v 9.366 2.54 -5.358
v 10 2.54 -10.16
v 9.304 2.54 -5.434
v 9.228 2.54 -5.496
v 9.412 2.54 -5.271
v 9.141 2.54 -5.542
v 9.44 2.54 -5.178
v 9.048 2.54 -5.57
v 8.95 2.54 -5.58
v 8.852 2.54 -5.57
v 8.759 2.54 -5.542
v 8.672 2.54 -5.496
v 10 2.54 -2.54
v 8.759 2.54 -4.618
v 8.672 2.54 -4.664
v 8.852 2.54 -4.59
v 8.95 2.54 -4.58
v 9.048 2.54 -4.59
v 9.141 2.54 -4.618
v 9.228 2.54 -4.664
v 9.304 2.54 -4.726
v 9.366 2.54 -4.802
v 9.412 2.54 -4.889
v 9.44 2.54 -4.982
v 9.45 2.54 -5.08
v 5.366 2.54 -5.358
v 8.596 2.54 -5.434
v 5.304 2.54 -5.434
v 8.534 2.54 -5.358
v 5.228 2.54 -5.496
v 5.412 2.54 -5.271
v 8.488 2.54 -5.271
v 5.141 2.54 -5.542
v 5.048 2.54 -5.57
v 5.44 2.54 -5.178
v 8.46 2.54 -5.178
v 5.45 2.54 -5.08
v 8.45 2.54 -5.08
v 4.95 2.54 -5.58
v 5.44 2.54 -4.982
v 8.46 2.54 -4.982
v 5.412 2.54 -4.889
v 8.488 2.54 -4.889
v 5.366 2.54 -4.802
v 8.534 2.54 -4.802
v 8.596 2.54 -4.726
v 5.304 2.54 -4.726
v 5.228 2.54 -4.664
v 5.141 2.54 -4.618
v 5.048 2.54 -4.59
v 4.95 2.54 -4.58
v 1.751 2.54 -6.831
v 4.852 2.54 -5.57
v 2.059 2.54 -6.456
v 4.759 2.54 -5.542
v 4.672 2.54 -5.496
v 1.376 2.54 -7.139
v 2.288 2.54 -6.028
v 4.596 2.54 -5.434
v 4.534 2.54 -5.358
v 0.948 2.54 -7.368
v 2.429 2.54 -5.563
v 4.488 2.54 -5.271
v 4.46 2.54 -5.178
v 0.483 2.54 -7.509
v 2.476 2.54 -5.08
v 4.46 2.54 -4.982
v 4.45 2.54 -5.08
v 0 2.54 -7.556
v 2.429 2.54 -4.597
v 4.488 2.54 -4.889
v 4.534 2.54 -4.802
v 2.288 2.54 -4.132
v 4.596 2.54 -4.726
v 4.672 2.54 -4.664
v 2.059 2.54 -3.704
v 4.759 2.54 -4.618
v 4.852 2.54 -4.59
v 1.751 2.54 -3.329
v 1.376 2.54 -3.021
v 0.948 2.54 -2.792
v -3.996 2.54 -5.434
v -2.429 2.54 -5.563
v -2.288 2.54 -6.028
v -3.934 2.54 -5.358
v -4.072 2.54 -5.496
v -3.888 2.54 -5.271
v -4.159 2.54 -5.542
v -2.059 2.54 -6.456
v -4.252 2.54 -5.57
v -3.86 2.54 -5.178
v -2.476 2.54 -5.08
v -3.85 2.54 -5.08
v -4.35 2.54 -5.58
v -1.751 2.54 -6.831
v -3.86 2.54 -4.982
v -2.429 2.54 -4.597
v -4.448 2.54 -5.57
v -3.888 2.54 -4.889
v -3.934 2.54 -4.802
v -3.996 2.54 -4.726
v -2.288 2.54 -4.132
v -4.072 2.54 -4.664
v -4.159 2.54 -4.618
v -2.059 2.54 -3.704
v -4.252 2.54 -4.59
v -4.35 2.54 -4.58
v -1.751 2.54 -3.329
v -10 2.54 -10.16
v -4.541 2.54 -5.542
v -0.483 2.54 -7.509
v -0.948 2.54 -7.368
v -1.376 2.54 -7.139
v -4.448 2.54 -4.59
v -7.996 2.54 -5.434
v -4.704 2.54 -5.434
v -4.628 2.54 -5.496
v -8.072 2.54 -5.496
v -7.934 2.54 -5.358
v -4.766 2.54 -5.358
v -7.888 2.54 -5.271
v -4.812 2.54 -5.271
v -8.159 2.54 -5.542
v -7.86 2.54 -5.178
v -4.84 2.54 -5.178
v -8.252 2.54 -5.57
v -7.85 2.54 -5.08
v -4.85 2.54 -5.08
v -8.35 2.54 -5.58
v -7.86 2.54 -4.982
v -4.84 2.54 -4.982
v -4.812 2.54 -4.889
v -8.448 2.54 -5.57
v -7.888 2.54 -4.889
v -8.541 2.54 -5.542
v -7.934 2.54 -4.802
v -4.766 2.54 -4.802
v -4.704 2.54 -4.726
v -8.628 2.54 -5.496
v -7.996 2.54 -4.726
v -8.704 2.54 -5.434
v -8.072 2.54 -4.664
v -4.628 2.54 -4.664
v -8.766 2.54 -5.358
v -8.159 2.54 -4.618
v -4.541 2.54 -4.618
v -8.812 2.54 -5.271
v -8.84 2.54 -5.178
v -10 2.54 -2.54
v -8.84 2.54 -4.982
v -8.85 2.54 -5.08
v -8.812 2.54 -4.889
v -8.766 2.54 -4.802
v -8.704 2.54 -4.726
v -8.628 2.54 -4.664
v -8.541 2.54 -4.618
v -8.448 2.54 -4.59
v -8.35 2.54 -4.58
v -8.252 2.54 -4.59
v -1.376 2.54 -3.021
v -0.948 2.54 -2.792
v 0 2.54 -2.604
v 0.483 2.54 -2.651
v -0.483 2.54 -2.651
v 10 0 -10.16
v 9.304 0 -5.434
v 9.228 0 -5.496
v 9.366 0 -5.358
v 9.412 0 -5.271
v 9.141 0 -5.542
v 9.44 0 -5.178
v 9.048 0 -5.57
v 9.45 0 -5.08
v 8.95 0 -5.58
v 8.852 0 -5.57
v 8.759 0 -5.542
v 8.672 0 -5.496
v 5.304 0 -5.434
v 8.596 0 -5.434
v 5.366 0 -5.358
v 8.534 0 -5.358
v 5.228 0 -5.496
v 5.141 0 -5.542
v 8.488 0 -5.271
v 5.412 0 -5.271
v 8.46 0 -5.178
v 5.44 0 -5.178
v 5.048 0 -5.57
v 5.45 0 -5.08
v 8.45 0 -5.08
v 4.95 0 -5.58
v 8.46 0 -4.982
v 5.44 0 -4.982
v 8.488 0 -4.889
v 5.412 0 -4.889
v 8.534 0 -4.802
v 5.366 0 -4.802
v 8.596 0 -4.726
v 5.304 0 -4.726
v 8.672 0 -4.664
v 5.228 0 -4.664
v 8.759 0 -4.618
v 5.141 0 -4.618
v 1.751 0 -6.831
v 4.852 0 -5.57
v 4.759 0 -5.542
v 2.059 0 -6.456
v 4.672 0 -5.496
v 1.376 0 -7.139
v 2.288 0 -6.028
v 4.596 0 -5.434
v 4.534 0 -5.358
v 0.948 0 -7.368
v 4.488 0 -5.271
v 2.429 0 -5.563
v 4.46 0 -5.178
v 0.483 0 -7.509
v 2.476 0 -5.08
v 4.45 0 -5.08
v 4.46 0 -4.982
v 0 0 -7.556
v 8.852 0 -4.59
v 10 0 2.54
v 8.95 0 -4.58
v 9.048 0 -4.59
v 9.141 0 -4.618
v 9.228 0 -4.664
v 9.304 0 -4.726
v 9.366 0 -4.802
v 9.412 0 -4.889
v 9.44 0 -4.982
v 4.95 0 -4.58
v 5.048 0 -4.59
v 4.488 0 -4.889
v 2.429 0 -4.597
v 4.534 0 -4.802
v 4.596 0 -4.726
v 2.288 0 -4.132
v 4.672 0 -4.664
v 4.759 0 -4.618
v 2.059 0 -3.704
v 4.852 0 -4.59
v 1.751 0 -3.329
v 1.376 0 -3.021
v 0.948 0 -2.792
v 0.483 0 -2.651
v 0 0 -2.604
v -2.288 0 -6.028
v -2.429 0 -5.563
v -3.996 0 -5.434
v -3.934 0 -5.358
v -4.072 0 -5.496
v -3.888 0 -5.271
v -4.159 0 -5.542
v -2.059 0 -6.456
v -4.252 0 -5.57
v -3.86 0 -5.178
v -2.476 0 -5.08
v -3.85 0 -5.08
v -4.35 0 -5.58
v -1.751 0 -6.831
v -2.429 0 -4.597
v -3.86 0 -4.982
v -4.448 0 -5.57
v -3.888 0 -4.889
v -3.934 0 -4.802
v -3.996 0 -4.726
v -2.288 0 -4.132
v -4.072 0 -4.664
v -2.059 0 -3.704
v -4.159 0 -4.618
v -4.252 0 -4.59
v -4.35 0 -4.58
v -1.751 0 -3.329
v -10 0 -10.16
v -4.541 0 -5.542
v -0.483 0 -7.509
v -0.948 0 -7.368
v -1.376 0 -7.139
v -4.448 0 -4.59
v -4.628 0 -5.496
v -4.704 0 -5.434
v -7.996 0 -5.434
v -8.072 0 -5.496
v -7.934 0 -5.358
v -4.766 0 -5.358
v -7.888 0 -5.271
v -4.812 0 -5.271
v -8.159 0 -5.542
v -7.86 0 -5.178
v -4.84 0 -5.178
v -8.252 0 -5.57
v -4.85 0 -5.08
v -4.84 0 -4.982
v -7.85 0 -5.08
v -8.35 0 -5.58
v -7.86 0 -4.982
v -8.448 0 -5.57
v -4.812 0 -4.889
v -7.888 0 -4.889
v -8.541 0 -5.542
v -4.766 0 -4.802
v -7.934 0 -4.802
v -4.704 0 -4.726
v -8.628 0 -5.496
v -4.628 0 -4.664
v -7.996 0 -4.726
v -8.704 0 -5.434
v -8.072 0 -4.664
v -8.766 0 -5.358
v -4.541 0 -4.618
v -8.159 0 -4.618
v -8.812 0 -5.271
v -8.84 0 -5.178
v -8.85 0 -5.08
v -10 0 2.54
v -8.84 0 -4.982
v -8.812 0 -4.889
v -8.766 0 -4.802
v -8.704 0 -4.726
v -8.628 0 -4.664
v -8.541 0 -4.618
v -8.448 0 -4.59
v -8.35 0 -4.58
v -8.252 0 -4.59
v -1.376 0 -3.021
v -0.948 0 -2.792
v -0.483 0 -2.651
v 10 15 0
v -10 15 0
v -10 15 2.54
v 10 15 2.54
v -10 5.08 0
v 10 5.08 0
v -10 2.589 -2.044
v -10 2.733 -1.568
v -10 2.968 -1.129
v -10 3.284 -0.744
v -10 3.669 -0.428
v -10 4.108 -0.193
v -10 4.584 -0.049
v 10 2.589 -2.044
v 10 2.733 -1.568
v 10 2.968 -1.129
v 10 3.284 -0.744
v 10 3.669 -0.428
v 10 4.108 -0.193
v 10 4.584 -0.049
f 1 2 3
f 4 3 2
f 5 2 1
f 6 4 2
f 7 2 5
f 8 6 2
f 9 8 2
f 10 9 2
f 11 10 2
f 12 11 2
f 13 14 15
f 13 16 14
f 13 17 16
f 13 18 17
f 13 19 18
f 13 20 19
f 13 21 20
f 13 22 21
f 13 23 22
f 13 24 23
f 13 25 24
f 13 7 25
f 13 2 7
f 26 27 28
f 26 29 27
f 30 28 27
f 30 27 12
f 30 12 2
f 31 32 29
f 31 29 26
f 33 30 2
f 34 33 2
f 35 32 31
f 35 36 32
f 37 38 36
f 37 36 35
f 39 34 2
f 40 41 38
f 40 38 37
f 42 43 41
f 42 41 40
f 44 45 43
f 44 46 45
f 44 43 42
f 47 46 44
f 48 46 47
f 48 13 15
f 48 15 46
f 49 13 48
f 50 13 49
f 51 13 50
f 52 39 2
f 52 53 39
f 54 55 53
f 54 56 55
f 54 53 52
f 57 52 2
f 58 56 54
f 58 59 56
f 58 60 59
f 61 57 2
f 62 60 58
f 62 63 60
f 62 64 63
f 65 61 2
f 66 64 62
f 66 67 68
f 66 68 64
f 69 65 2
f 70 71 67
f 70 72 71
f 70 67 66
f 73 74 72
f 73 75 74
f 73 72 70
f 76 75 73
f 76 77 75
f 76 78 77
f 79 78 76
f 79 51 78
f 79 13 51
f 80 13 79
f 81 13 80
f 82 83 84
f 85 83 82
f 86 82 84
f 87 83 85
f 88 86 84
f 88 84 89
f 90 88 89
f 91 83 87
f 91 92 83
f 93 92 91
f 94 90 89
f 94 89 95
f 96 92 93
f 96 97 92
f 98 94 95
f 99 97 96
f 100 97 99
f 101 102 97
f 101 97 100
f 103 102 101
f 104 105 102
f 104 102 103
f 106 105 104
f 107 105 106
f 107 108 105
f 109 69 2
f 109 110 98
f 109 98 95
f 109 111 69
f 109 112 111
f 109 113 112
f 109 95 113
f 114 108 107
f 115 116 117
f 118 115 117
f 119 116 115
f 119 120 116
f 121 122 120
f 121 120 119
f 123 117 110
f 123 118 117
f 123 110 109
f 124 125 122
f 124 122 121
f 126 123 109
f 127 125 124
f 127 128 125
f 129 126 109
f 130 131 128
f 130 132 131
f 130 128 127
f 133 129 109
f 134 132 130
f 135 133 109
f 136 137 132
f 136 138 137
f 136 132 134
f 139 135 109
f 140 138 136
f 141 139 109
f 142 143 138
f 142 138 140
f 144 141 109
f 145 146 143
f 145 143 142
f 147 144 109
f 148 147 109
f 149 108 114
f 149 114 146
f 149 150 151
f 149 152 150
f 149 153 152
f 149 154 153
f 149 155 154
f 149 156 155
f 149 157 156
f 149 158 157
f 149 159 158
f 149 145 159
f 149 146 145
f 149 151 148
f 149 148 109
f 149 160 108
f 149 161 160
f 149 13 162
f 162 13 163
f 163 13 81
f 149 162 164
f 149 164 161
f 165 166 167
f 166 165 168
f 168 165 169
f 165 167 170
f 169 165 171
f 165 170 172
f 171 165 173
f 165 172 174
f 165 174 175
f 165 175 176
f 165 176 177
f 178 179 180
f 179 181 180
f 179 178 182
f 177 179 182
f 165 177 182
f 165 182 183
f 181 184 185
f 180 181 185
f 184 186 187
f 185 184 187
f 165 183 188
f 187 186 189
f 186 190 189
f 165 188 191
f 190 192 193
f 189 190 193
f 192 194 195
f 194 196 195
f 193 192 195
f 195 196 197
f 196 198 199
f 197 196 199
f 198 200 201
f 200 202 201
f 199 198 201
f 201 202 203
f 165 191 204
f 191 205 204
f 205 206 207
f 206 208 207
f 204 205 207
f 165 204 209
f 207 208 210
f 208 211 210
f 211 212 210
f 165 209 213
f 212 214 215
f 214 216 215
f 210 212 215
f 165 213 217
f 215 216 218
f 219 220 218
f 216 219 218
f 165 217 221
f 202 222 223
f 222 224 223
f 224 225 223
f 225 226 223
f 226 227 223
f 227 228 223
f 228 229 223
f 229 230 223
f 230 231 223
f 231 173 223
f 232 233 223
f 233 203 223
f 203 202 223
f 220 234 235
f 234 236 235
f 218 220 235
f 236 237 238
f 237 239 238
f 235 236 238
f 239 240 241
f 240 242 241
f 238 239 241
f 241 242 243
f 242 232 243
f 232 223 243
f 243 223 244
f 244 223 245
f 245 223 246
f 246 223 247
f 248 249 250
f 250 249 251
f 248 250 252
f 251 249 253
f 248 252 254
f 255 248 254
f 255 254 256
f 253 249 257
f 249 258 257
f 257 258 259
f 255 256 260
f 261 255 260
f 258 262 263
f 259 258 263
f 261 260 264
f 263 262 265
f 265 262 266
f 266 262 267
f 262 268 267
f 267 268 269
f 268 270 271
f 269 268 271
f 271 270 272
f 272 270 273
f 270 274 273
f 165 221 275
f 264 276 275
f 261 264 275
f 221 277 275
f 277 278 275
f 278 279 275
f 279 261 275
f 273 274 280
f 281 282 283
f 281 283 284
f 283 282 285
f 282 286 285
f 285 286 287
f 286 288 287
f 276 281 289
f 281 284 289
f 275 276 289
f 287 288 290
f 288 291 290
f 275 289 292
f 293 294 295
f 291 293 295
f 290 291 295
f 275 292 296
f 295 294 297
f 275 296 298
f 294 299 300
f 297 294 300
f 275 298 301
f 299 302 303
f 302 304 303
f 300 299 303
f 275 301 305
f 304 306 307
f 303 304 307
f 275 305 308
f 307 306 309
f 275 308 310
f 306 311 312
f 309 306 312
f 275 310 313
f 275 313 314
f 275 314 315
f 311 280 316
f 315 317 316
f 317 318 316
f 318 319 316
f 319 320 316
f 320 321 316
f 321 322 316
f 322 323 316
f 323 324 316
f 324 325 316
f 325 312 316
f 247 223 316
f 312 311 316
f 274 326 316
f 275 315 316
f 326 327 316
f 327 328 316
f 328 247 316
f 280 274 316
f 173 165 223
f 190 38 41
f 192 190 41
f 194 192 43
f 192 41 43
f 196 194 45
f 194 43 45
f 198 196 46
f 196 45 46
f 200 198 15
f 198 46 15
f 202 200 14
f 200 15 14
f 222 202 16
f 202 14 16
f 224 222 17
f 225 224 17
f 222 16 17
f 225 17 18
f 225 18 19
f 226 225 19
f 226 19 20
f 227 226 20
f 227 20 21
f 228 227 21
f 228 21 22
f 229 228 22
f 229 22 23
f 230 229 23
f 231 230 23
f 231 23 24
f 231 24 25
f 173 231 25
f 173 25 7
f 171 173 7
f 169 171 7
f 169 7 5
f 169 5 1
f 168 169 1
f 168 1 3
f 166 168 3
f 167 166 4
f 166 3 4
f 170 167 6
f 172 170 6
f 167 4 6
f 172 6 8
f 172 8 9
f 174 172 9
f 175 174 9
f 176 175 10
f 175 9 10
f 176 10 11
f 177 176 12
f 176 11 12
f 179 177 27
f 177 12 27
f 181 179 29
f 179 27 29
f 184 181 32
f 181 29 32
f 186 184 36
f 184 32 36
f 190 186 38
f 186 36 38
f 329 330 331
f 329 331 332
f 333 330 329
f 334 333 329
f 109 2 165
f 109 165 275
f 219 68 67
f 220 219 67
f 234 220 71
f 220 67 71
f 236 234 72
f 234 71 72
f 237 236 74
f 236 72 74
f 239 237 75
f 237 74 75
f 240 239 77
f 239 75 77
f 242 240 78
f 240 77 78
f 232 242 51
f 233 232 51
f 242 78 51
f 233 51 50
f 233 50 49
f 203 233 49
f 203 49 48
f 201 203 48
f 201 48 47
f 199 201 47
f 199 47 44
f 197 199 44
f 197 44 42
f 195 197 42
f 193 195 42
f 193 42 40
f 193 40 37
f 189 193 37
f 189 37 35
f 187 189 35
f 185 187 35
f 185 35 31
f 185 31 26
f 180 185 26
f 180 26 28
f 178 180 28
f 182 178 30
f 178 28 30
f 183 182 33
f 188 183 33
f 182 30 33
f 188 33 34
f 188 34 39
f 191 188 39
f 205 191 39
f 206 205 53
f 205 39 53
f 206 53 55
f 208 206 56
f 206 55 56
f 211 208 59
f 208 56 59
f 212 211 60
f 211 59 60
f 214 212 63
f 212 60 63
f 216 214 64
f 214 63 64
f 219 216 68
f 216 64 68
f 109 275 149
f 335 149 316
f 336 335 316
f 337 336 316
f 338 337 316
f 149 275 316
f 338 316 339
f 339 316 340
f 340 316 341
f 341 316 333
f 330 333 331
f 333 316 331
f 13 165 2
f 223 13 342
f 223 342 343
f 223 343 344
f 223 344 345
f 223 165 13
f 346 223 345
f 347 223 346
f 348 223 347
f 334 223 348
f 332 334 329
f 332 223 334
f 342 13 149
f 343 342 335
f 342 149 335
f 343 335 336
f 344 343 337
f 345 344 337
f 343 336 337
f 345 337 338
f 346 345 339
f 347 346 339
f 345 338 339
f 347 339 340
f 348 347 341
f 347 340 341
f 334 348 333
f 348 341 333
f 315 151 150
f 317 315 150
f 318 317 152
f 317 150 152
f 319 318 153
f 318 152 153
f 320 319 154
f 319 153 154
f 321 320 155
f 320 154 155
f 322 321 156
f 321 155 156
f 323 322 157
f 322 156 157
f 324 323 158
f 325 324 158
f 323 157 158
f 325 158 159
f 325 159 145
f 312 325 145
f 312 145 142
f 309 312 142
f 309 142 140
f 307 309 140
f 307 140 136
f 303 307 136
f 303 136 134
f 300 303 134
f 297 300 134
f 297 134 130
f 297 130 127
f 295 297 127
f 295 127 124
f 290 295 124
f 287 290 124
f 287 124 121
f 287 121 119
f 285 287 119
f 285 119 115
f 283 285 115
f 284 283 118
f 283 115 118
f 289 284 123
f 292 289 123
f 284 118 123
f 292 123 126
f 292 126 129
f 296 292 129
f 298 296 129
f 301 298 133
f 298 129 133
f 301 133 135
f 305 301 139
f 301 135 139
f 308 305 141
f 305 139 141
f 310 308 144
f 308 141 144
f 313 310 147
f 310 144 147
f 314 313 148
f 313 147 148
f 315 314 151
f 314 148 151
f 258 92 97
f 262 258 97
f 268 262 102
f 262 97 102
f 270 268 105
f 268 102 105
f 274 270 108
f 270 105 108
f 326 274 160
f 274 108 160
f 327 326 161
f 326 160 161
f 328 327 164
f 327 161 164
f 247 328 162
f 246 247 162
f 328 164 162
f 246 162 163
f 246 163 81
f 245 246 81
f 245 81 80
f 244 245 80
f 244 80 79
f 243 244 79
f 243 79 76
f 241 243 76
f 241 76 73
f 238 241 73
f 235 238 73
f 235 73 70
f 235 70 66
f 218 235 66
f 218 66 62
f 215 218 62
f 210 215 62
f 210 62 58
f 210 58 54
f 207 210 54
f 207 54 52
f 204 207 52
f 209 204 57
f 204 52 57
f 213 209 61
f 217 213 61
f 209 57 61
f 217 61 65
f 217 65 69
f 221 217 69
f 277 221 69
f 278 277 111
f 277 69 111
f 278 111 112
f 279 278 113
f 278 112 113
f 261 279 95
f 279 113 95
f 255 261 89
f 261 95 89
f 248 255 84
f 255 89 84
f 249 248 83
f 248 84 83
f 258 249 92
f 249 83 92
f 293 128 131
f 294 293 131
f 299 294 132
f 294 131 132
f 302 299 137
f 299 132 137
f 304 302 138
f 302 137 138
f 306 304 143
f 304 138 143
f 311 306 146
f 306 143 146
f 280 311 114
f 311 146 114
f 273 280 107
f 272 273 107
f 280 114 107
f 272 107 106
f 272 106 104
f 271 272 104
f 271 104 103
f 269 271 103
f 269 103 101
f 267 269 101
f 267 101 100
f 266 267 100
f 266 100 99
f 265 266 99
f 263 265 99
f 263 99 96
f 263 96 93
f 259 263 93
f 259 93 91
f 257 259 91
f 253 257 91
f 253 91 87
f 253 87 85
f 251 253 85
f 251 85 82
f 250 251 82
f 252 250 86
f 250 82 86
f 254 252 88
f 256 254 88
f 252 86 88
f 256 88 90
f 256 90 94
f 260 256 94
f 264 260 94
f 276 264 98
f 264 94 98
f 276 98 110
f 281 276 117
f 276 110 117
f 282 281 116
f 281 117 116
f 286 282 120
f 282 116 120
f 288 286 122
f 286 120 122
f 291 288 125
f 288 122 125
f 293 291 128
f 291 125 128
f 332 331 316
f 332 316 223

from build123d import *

# Parameters (mm, degrees)
SKETCH1_W           = 20
SKETCH1_H           = 15
BOSS_EXTRUDE1_DEPTH = 2.54
SKETCH2_W           = 20
SKETCH2_H           = 2.54
BOSS_EXTRUDE2_DEPTH = 10.16
CUT_EXTRUDE1_REACH  = 20.933
SKETCH3_R           = 2.4765
FILLET1_R           = 2.54
SKETCH4_R           = 0.5
CUT_EXTRUDE2_DEPTH  = 10


with BuildPart() as part:
    # Sketch1 → Boss-Extrude1 (new body)
    with BuildSketch(Plane.XY):
        with Locations((0, 7.5)):
            Rectangle(SKETCH1_W, SKETCH1_H)
    extrude(amount=BOSS_EXTRUDE1_DEPTH)

    # Sketch2 → Boss-Extrude2 (add)
    with BuildSketch(Plane(origin=(0, 0, 0), x_dir=(-1, 0, 0), z_dir=(0, 0, -1))):
        with Locations((0, 1.27)):
            Rectangle(SKETCH2_W, SKETCH2_H)
    extrude(amount=BOSS_EXTRUDE2_DEPTH)

    # Sketch3 → Cut-Extrude1 (cut, up to next)
    with BuildSketch(Plane(origin=(0, 2.54, 0), x_dir=(1, 0, 0), z_dir=(0, 1, 0)), mode=Mode.PRIVATE) as cut_extrude1_sk1:
        with Locations(Location((0, 5.08, 0), (0, 0, 180))):
            Circle(SKETCH3_R)
    cut_extrude1_tool1 = extrude(cut_extrude1_sk1.sketch, amount=-CUT_EXTRUDE1_REACH, mode=Mode.PRIVATE) & part.part
    add(cut_extrude1_tool1.solids().sort_by_distance((0, 2.54, -5.08))[0], mode=Mode.SUBTRACT)

    # Fillet1
    fillet1_edges = [part.edges().sort_by_distance(p)[0] for p in [
        (0, 2.54, 0),
    ]]
    fillet(fillet1_edges, radius=FILLET1_R)

    # Sketch4 → Cut-Extrude2 (cut)
    with BuildSketch(Plane(origin=(0, 2.54, 0), x_dir=(1, 0, 0), z_dir=(0, 1, 0))):
        with Locations(Location((-8.35, 5.08, 0), (0, 0, 180))):
            Circle(SKETCH4_R)
        with Locations(Location((-4.35, 5.08, 0), (0, 0, 180))):
            Circle(SKETCH4_R)
        with Locations(Location((4.95, 5.08, 0), (0, 0, 180))):
            Circle(SKETCH4_R)
        with Locations(Location((8.95, 5.08, 0), (0, 0, 180))):
            Circle(SKETCH4_R)
    extrude(amount=-CUT_EXTRUDE2_DEPTH, mode=Mode.SUBTRACT)


solid = part.part
